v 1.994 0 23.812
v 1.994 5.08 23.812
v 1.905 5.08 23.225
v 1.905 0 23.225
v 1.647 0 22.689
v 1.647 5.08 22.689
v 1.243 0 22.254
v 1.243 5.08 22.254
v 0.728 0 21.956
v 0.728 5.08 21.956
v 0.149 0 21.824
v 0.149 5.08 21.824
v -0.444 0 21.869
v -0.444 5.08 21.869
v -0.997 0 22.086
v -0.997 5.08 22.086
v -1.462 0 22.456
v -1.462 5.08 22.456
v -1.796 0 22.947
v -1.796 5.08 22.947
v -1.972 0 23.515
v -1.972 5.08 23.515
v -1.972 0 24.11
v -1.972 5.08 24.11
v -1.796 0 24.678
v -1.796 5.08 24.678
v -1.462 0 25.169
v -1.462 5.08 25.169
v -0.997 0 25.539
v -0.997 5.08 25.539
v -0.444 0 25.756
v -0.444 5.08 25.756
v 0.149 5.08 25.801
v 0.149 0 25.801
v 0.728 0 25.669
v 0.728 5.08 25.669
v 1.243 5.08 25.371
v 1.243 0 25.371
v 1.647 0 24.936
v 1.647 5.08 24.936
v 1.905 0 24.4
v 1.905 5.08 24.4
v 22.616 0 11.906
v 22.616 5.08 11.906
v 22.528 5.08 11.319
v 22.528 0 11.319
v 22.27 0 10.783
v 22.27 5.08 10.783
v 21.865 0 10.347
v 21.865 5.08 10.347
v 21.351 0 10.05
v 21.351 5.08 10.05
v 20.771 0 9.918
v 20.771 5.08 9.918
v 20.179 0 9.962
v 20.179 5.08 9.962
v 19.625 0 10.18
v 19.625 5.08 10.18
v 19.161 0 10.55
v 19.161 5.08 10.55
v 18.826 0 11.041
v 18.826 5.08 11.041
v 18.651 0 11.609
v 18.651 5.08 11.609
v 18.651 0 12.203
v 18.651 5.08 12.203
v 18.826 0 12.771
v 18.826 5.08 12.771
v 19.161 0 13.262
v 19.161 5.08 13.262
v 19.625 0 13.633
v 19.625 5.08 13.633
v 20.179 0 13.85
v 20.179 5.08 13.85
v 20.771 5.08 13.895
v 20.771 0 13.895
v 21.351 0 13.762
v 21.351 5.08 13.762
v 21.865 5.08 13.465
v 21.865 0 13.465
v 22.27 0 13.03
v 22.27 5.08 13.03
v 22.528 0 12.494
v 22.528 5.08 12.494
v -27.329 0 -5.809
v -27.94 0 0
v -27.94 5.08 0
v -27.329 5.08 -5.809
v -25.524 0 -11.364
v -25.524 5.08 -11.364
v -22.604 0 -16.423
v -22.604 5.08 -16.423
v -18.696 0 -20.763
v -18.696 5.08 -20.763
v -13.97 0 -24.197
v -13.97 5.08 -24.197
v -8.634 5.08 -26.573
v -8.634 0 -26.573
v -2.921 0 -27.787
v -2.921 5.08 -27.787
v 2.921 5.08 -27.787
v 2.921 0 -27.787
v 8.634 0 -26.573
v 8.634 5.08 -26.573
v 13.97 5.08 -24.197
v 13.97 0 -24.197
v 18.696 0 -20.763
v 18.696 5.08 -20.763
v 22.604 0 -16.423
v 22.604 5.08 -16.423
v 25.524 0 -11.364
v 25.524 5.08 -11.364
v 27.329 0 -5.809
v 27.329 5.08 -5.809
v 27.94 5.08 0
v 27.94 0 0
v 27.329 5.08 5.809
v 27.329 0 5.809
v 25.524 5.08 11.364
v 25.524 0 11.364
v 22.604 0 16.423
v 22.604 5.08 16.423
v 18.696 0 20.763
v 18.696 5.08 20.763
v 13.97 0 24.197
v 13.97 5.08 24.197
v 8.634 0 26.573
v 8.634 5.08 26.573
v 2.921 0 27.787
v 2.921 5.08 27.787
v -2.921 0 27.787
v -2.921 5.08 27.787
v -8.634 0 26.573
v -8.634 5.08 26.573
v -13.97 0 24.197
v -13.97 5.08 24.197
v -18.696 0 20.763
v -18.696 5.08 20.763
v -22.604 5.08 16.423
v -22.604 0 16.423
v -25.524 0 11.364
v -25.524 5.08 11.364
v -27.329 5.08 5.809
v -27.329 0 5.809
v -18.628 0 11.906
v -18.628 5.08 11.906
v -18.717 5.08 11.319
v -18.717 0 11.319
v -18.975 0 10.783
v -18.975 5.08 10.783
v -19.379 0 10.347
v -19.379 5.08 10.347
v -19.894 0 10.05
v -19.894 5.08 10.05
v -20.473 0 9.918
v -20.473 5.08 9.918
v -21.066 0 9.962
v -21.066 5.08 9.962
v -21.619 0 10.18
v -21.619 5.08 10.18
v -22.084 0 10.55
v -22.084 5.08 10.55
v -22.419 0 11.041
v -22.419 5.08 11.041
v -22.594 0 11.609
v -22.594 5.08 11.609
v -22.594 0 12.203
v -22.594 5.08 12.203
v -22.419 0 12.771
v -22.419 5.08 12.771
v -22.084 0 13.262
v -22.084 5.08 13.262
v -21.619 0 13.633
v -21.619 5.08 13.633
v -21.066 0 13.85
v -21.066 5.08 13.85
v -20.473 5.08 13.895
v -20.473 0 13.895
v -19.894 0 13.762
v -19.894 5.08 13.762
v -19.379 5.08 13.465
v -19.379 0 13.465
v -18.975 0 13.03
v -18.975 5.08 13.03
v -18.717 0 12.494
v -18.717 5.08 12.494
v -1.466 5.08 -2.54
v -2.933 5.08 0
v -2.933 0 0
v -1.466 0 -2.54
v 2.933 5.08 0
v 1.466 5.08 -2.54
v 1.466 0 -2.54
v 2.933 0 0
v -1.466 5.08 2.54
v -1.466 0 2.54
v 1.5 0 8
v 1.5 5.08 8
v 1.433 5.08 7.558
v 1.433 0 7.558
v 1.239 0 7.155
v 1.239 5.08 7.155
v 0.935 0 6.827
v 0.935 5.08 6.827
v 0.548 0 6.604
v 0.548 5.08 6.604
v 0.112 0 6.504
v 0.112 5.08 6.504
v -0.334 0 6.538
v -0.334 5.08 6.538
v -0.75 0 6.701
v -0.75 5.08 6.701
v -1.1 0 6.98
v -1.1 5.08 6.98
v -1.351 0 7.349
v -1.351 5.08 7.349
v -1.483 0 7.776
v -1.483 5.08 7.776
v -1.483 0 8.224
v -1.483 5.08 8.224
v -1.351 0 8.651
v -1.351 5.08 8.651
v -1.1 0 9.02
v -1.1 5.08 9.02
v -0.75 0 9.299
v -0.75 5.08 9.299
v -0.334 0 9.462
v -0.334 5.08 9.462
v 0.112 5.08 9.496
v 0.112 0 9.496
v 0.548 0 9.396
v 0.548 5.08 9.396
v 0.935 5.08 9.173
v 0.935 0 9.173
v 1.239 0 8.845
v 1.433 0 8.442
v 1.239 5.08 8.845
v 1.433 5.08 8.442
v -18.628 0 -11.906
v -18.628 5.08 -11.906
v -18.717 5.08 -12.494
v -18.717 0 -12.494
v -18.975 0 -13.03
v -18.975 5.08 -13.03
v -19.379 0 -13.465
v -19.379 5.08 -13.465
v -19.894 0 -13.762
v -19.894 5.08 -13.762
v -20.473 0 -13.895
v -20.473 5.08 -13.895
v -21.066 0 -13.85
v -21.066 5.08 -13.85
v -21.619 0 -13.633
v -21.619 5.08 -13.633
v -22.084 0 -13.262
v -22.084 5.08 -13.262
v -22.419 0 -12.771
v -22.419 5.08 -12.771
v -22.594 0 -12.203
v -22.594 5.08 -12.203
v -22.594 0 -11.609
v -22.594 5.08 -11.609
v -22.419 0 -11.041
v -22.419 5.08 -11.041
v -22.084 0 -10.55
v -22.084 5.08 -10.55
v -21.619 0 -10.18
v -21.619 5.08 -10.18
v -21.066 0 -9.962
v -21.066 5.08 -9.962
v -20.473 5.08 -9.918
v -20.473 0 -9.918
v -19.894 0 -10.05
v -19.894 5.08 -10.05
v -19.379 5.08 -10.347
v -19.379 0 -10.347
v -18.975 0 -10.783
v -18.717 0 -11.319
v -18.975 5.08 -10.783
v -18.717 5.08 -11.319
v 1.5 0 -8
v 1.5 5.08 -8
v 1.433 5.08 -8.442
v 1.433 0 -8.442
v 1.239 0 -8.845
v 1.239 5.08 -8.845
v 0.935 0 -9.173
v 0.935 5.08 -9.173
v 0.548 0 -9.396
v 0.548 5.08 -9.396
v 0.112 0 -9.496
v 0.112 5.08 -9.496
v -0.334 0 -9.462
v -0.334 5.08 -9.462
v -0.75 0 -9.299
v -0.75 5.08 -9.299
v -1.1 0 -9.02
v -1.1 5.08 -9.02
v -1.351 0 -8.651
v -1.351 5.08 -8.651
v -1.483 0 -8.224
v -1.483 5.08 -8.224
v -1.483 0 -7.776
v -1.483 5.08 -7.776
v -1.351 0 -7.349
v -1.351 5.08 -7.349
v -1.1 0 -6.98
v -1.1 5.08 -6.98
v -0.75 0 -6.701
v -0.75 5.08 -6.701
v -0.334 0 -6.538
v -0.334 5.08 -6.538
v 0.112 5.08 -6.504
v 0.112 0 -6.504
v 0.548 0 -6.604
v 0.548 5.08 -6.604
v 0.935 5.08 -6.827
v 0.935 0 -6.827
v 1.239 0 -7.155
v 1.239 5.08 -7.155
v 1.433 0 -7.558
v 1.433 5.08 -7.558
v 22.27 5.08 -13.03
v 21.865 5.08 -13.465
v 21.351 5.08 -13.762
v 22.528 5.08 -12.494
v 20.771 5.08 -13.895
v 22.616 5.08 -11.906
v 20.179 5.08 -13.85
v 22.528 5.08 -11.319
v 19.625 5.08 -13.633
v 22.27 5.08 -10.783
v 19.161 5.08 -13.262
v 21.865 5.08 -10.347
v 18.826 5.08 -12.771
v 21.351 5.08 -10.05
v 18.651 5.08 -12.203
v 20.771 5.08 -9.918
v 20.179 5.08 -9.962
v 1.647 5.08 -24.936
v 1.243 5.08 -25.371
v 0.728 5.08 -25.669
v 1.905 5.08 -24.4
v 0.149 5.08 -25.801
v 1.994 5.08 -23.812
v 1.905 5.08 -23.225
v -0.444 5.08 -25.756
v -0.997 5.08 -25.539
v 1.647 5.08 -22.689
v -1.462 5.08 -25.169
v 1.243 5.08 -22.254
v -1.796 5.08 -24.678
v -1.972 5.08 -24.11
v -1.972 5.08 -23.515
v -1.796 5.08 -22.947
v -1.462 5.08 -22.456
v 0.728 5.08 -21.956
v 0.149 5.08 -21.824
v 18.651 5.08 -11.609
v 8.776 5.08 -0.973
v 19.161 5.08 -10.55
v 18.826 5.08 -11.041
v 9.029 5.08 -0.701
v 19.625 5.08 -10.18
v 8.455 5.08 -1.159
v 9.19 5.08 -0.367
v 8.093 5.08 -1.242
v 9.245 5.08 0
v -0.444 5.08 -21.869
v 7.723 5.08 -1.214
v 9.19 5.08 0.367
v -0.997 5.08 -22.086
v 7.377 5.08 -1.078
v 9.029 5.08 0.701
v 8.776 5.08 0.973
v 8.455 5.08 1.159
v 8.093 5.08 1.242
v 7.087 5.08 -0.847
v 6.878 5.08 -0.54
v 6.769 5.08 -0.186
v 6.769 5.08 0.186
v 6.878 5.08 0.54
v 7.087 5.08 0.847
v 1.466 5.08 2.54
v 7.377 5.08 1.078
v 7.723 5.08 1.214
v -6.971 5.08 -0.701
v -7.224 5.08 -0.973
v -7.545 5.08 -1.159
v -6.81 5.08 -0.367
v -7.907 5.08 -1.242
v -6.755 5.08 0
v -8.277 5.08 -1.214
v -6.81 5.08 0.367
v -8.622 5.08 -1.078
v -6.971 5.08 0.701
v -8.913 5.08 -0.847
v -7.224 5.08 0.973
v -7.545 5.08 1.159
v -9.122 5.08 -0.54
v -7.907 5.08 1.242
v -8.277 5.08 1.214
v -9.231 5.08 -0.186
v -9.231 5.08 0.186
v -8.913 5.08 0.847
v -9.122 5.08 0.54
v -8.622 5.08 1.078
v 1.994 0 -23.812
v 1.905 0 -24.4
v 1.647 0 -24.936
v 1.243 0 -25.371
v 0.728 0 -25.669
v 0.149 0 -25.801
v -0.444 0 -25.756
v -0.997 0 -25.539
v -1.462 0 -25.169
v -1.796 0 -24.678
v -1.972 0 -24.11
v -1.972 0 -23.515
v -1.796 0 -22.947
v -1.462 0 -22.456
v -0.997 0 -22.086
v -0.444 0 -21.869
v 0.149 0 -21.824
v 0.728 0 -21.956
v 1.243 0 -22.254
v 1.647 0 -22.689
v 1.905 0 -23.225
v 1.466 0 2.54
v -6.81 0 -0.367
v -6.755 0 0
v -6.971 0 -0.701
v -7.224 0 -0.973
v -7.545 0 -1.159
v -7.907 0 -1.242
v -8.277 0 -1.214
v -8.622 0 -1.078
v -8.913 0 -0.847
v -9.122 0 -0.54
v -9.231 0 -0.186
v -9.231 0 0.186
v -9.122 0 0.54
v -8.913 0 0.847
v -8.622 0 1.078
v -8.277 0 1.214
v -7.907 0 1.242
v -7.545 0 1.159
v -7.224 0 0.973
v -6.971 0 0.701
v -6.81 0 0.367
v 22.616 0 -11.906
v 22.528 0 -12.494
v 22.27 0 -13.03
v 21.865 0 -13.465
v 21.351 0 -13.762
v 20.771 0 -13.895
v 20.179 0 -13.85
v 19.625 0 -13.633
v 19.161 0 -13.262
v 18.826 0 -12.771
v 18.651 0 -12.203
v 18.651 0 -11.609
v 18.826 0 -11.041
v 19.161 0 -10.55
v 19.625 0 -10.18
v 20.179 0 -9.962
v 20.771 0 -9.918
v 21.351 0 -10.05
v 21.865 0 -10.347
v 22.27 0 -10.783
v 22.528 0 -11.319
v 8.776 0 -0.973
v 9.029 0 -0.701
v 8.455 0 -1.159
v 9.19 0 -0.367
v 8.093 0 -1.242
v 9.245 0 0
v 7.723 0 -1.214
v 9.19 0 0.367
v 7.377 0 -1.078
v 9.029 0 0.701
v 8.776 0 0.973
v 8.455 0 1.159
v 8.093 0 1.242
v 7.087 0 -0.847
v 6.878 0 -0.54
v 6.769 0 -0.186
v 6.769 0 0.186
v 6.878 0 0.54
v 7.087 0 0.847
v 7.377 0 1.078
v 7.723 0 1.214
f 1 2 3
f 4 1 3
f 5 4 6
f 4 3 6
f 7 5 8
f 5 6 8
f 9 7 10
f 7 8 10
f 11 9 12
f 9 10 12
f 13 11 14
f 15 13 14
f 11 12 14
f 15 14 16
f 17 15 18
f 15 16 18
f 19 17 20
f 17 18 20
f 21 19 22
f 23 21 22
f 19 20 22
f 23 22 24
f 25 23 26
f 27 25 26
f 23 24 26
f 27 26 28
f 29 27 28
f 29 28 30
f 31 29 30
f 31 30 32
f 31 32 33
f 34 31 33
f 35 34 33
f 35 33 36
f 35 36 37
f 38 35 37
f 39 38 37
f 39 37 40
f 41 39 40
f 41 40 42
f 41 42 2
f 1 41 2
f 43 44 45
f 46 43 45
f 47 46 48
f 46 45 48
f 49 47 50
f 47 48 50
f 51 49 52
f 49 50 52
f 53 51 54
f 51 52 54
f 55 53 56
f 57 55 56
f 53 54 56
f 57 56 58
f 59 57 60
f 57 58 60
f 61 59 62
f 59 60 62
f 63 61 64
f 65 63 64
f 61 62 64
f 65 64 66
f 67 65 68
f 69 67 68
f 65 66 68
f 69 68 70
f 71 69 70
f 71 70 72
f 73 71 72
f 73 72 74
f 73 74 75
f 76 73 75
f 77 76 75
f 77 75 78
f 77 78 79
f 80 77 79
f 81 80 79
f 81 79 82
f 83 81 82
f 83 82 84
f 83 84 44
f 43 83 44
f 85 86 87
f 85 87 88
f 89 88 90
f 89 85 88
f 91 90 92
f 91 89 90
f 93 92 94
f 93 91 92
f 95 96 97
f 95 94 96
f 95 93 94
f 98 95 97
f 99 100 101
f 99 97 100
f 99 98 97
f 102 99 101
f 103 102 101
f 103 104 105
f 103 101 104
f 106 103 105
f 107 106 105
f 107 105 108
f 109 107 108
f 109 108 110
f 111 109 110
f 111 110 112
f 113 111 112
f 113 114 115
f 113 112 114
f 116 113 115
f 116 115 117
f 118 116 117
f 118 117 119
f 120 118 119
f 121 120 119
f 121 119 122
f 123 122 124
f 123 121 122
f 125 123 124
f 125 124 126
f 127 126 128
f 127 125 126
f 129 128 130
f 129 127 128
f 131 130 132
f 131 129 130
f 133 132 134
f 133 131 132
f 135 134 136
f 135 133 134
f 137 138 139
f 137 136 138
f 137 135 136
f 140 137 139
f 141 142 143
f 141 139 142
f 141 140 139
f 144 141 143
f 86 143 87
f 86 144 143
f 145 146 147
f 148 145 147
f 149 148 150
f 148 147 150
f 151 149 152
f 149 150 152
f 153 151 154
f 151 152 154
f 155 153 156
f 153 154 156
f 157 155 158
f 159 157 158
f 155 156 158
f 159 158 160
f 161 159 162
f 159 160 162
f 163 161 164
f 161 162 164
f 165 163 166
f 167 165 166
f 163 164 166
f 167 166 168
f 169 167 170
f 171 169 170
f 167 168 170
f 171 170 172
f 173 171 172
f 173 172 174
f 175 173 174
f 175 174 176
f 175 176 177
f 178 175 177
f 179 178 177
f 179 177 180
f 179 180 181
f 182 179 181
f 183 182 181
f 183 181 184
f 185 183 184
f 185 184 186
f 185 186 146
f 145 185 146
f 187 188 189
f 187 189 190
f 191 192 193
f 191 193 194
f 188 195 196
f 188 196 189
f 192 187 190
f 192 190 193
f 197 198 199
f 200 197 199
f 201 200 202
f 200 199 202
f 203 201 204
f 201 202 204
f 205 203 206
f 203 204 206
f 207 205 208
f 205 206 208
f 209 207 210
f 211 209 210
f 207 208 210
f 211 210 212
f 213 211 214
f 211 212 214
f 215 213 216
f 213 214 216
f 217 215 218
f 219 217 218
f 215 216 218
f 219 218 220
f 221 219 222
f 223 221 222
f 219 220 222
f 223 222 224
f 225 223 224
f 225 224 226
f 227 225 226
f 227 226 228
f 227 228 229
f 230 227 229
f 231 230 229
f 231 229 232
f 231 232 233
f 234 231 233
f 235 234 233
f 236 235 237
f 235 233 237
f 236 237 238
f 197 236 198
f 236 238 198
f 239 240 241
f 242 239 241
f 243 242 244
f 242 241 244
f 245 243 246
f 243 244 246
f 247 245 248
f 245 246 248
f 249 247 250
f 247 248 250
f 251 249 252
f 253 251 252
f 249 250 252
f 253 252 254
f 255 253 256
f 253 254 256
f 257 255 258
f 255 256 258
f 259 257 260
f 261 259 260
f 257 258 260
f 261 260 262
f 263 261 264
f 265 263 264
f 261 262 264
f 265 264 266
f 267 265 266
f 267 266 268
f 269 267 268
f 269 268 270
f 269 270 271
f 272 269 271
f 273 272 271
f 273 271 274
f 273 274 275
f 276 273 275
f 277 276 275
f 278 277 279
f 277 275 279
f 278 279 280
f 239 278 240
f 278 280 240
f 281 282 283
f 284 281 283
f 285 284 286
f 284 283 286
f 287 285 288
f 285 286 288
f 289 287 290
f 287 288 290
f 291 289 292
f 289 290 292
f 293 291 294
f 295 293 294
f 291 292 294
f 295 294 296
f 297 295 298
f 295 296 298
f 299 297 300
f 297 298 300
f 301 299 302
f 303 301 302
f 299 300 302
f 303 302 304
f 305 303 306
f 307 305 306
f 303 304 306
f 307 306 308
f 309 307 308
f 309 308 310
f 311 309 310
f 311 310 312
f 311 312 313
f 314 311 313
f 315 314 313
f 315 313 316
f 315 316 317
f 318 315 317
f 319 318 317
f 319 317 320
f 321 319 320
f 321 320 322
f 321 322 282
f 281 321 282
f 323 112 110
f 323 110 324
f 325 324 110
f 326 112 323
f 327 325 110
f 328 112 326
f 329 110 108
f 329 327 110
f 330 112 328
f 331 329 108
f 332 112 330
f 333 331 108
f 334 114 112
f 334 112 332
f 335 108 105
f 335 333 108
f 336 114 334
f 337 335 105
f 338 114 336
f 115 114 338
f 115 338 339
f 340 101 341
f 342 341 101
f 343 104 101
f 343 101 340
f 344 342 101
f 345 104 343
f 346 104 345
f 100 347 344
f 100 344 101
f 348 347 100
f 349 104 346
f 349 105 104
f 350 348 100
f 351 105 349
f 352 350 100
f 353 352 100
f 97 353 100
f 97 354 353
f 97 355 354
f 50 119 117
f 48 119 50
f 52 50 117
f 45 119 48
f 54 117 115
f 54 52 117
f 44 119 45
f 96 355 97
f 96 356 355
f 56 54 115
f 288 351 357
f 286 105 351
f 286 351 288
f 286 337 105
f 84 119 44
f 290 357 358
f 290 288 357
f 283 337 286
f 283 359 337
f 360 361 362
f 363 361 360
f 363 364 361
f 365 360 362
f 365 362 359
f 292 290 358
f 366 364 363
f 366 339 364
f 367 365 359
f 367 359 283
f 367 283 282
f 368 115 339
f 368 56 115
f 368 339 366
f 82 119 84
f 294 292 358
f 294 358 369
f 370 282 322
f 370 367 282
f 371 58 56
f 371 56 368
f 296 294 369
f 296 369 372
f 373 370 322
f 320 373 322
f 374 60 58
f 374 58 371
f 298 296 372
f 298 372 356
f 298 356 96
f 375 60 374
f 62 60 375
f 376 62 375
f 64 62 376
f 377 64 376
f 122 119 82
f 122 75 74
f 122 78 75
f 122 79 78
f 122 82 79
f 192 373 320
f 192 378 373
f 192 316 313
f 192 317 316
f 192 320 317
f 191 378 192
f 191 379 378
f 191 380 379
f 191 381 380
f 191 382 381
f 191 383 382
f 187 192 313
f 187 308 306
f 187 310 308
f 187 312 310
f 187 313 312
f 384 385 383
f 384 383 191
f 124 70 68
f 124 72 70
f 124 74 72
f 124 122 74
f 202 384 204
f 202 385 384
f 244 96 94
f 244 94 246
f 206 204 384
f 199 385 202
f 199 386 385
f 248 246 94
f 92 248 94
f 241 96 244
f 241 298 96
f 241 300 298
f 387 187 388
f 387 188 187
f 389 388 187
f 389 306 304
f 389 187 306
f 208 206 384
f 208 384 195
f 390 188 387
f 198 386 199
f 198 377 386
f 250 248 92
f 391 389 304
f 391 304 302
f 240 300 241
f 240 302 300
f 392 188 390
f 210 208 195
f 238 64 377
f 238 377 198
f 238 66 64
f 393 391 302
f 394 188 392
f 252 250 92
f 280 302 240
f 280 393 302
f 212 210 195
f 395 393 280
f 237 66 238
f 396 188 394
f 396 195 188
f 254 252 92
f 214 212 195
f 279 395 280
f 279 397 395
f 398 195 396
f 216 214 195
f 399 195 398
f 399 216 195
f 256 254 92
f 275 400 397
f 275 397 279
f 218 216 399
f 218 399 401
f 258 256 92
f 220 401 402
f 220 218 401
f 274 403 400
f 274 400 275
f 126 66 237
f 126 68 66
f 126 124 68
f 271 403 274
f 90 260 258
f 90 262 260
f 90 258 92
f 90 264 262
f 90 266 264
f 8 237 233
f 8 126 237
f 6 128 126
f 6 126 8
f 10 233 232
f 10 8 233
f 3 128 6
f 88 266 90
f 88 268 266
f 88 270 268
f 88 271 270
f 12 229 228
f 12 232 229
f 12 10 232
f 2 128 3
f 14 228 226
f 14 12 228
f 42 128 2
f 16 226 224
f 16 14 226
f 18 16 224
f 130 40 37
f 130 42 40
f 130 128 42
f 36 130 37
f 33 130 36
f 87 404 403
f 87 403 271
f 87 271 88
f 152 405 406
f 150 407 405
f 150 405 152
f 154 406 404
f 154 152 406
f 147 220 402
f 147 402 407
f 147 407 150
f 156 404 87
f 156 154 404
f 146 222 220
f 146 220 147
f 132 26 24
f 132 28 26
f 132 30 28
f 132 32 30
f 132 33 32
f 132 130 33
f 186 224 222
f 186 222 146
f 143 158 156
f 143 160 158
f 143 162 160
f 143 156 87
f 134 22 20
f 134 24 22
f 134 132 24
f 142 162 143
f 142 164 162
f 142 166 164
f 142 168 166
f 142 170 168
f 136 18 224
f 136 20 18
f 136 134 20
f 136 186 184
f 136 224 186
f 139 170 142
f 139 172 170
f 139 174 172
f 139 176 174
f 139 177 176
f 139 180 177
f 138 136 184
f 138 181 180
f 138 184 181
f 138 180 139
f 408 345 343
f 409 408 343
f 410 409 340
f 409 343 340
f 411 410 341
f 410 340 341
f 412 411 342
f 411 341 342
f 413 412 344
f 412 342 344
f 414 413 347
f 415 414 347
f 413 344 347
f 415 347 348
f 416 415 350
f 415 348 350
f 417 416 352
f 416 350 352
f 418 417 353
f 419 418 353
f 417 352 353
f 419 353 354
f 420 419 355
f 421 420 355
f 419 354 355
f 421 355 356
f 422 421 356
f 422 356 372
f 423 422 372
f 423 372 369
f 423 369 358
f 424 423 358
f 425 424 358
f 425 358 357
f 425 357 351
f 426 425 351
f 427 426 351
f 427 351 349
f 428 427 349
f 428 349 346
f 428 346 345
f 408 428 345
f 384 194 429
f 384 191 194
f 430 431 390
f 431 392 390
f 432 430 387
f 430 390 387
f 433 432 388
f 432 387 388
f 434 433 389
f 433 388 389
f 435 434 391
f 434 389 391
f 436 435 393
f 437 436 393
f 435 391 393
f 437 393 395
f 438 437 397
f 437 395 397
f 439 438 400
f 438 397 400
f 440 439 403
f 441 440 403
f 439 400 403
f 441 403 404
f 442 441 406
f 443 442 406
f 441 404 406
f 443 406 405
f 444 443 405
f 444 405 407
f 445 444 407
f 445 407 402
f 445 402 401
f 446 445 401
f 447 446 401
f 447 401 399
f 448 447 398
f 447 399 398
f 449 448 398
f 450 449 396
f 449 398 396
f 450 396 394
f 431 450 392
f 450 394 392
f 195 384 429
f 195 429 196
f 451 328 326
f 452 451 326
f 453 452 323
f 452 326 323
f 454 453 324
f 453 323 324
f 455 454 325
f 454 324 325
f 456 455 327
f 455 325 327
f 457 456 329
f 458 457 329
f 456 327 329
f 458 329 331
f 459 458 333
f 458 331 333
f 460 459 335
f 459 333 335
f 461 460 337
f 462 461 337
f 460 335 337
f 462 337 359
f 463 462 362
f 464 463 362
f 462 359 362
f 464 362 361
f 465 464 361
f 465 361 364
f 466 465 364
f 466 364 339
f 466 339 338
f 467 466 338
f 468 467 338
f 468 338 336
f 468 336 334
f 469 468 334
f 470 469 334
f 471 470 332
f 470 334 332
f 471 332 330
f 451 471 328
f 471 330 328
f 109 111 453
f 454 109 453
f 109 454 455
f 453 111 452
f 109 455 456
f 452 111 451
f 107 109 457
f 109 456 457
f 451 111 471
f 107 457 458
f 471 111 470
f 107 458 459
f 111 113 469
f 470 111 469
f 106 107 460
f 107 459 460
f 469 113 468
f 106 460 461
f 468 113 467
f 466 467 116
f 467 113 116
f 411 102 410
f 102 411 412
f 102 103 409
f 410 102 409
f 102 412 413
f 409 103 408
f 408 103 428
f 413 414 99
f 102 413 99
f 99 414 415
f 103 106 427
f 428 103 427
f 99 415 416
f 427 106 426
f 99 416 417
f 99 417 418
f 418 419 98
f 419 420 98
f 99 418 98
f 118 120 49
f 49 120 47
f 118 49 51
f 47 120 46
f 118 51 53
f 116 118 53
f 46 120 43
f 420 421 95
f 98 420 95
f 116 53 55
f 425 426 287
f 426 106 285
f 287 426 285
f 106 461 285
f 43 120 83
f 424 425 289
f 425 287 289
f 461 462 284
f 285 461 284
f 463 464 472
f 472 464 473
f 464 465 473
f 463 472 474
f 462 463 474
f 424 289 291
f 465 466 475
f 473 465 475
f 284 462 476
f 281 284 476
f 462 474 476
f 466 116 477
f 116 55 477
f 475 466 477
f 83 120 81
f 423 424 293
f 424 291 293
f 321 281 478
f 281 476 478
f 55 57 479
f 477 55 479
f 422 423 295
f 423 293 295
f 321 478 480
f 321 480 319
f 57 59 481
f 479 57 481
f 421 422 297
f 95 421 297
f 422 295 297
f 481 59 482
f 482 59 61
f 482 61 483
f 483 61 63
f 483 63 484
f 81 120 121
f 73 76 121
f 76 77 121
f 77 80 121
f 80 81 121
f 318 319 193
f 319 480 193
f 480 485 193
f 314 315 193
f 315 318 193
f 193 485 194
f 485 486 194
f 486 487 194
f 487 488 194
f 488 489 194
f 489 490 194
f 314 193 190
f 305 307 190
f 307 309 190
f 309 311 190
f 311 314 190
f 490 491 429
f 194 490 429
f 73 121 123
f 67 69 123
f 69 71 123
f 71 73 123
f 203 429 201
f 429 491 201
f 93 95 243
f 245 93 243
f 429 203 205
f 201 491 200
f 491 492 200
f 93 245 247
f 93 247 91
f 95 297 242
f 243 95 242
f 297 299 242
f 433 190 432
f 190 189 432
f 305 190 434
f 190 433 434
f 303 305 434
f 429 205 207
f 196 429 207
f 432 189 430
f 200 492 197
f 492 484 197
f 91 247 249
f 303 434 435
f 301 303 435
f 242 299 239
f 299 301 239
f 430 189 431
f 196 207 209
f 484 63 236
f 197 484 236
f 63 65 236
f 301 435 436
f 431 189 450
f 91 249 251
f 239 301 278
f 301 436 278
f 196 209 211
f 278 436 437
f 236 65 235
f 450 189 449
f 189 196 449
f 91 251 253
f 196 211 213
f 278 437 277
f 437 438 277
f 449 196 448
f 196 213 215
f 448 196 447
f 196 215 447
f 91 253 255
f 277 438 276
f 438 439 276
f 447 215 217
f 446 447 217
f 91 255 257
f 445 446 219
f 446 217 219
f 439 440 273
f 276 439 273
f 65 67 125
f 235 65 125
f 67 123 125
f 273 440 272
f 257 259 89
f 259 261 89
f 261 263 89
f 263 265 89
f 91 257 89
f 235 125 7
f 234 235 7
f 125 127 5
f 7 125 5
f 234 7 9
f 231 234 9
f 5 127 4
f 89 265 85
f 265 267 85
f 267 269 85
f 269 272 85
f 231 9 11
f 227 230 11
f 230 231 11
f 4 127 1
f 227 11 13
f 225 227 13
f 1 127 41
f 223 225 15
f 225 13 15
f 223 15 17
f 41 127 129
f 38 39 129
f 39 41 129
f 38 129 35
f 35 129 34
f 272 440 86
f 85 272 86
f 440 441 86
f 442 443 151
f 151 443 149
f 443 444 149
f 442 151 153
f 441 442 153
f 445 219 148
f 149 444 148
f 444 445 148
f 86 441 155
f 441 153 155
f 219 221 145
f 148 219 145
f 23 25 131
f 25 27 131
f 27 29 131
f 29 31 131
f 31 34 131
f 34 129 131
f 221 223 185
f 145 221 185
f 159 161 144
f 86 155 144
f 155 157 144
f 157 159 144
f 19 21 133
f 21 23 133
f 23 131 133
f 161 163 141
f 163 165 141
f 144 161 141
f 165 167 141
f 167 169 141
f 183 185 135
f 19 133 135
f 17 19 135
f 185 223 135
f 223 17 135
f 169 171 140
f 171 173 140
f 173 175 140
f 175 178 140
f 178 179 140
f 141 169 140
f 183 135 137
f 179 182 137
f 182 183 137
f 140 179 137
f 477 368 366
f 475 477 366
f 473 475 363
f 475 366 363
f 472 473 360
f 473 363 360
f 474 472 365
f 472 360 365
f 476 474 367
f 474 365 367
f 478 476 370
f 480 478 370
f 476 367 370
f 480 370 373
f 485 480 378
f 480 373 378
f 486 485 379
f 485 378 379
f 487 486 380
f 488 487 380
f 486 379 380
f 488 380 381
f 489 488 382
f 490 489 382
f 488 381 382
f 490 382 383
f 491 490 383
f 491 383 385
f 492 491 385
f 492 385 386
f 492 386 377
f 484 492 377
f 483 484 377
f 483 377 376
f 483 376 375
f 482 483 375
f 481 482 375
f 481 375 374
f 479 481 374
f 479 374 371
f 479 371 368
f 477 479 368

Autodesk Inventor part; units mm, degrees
ref_plane "YZ Plane" through (0, 0, 0) normal (1, 0, 0) x (0, 1, 0)
ref_plane "XZ Plane" through (0, 0, 0) normal (0, 1, 0) x (-1, 0, 0)
ref_plane "XY Plane" through (0, 0, 0) normal (0, 0, 1) x (1, 0, 0)
sketch "Sketch1" plane through (0, 0, 0) normal (0, 1, 0) x (-1, 0, 0)
  circle A0 centre (0, 0) radius 27.94
  dimension "d0" = 55.88
extrude "Extrusion1" add sketch "Sketch1" along normal blind 5.08
sketch "Sketch6" plane through (0, 5.08, 0) normal (0, 1, 0) x (1, 0, 0)
  circle A0 centre (0, 23.8125) radius 1.9939
  circle A1 centre (20.6222, 11.9063) radius 1.9939
  circle A2 centre (20.6222, -11.9063) radius 1.9939
  circle A3 centre (0, -23.8125) radius 1.9939
  circle A4 centre (-20.6222, -11.9063) radius 1.9939
  circle A5 centre (-20.6222, 11.9063) radius 1.9939
  point P0 (0, 0)
  point P1 (0, 0)
extrude "Extrusion5" cut sketch "Sketch6" against normal blind 25.4
sketch "Sketch12" plane through (0, 5.08, 0) normal (0, 1, 0) x (1, 0, 0)
  circle A0 centre (0, 0) radius 27.94 projected
  line L0 (2.9329, 0) -> (1.4665, -2.54)
  line L1 (1.4665, -2.54) -> (-1.4665, -2.54)
  line L2 (-1.4665, -2.54) -> (-2.9329, 0)
  line L3 (-2.9329, 0) -> (-1.4665, 2.54)
  line L4 (-1.4665, 2.54) -> (1.4665, 2.54)
  line L5 (1.4665, 2.54) -> (2.9329, 0)
  circle A1 centre (-8, 0) radius 1.245
  circle A2 centre (8, 0) radius 1.245
  circle A3 centre (0, 8) radius 1.5
  circle A4 centre (0, -8) radius 1.5
  point P0 (0, 0)
  dimension "d33" = 5.08
extrude "Extrusion9" cut sketch "Sketch12" against normal blind 25.4 contours L0 L1 L2 L3 L4 L5 | A1 | A2 | A3 | A4
properties part number "WheelMount_v2_vCAD"
